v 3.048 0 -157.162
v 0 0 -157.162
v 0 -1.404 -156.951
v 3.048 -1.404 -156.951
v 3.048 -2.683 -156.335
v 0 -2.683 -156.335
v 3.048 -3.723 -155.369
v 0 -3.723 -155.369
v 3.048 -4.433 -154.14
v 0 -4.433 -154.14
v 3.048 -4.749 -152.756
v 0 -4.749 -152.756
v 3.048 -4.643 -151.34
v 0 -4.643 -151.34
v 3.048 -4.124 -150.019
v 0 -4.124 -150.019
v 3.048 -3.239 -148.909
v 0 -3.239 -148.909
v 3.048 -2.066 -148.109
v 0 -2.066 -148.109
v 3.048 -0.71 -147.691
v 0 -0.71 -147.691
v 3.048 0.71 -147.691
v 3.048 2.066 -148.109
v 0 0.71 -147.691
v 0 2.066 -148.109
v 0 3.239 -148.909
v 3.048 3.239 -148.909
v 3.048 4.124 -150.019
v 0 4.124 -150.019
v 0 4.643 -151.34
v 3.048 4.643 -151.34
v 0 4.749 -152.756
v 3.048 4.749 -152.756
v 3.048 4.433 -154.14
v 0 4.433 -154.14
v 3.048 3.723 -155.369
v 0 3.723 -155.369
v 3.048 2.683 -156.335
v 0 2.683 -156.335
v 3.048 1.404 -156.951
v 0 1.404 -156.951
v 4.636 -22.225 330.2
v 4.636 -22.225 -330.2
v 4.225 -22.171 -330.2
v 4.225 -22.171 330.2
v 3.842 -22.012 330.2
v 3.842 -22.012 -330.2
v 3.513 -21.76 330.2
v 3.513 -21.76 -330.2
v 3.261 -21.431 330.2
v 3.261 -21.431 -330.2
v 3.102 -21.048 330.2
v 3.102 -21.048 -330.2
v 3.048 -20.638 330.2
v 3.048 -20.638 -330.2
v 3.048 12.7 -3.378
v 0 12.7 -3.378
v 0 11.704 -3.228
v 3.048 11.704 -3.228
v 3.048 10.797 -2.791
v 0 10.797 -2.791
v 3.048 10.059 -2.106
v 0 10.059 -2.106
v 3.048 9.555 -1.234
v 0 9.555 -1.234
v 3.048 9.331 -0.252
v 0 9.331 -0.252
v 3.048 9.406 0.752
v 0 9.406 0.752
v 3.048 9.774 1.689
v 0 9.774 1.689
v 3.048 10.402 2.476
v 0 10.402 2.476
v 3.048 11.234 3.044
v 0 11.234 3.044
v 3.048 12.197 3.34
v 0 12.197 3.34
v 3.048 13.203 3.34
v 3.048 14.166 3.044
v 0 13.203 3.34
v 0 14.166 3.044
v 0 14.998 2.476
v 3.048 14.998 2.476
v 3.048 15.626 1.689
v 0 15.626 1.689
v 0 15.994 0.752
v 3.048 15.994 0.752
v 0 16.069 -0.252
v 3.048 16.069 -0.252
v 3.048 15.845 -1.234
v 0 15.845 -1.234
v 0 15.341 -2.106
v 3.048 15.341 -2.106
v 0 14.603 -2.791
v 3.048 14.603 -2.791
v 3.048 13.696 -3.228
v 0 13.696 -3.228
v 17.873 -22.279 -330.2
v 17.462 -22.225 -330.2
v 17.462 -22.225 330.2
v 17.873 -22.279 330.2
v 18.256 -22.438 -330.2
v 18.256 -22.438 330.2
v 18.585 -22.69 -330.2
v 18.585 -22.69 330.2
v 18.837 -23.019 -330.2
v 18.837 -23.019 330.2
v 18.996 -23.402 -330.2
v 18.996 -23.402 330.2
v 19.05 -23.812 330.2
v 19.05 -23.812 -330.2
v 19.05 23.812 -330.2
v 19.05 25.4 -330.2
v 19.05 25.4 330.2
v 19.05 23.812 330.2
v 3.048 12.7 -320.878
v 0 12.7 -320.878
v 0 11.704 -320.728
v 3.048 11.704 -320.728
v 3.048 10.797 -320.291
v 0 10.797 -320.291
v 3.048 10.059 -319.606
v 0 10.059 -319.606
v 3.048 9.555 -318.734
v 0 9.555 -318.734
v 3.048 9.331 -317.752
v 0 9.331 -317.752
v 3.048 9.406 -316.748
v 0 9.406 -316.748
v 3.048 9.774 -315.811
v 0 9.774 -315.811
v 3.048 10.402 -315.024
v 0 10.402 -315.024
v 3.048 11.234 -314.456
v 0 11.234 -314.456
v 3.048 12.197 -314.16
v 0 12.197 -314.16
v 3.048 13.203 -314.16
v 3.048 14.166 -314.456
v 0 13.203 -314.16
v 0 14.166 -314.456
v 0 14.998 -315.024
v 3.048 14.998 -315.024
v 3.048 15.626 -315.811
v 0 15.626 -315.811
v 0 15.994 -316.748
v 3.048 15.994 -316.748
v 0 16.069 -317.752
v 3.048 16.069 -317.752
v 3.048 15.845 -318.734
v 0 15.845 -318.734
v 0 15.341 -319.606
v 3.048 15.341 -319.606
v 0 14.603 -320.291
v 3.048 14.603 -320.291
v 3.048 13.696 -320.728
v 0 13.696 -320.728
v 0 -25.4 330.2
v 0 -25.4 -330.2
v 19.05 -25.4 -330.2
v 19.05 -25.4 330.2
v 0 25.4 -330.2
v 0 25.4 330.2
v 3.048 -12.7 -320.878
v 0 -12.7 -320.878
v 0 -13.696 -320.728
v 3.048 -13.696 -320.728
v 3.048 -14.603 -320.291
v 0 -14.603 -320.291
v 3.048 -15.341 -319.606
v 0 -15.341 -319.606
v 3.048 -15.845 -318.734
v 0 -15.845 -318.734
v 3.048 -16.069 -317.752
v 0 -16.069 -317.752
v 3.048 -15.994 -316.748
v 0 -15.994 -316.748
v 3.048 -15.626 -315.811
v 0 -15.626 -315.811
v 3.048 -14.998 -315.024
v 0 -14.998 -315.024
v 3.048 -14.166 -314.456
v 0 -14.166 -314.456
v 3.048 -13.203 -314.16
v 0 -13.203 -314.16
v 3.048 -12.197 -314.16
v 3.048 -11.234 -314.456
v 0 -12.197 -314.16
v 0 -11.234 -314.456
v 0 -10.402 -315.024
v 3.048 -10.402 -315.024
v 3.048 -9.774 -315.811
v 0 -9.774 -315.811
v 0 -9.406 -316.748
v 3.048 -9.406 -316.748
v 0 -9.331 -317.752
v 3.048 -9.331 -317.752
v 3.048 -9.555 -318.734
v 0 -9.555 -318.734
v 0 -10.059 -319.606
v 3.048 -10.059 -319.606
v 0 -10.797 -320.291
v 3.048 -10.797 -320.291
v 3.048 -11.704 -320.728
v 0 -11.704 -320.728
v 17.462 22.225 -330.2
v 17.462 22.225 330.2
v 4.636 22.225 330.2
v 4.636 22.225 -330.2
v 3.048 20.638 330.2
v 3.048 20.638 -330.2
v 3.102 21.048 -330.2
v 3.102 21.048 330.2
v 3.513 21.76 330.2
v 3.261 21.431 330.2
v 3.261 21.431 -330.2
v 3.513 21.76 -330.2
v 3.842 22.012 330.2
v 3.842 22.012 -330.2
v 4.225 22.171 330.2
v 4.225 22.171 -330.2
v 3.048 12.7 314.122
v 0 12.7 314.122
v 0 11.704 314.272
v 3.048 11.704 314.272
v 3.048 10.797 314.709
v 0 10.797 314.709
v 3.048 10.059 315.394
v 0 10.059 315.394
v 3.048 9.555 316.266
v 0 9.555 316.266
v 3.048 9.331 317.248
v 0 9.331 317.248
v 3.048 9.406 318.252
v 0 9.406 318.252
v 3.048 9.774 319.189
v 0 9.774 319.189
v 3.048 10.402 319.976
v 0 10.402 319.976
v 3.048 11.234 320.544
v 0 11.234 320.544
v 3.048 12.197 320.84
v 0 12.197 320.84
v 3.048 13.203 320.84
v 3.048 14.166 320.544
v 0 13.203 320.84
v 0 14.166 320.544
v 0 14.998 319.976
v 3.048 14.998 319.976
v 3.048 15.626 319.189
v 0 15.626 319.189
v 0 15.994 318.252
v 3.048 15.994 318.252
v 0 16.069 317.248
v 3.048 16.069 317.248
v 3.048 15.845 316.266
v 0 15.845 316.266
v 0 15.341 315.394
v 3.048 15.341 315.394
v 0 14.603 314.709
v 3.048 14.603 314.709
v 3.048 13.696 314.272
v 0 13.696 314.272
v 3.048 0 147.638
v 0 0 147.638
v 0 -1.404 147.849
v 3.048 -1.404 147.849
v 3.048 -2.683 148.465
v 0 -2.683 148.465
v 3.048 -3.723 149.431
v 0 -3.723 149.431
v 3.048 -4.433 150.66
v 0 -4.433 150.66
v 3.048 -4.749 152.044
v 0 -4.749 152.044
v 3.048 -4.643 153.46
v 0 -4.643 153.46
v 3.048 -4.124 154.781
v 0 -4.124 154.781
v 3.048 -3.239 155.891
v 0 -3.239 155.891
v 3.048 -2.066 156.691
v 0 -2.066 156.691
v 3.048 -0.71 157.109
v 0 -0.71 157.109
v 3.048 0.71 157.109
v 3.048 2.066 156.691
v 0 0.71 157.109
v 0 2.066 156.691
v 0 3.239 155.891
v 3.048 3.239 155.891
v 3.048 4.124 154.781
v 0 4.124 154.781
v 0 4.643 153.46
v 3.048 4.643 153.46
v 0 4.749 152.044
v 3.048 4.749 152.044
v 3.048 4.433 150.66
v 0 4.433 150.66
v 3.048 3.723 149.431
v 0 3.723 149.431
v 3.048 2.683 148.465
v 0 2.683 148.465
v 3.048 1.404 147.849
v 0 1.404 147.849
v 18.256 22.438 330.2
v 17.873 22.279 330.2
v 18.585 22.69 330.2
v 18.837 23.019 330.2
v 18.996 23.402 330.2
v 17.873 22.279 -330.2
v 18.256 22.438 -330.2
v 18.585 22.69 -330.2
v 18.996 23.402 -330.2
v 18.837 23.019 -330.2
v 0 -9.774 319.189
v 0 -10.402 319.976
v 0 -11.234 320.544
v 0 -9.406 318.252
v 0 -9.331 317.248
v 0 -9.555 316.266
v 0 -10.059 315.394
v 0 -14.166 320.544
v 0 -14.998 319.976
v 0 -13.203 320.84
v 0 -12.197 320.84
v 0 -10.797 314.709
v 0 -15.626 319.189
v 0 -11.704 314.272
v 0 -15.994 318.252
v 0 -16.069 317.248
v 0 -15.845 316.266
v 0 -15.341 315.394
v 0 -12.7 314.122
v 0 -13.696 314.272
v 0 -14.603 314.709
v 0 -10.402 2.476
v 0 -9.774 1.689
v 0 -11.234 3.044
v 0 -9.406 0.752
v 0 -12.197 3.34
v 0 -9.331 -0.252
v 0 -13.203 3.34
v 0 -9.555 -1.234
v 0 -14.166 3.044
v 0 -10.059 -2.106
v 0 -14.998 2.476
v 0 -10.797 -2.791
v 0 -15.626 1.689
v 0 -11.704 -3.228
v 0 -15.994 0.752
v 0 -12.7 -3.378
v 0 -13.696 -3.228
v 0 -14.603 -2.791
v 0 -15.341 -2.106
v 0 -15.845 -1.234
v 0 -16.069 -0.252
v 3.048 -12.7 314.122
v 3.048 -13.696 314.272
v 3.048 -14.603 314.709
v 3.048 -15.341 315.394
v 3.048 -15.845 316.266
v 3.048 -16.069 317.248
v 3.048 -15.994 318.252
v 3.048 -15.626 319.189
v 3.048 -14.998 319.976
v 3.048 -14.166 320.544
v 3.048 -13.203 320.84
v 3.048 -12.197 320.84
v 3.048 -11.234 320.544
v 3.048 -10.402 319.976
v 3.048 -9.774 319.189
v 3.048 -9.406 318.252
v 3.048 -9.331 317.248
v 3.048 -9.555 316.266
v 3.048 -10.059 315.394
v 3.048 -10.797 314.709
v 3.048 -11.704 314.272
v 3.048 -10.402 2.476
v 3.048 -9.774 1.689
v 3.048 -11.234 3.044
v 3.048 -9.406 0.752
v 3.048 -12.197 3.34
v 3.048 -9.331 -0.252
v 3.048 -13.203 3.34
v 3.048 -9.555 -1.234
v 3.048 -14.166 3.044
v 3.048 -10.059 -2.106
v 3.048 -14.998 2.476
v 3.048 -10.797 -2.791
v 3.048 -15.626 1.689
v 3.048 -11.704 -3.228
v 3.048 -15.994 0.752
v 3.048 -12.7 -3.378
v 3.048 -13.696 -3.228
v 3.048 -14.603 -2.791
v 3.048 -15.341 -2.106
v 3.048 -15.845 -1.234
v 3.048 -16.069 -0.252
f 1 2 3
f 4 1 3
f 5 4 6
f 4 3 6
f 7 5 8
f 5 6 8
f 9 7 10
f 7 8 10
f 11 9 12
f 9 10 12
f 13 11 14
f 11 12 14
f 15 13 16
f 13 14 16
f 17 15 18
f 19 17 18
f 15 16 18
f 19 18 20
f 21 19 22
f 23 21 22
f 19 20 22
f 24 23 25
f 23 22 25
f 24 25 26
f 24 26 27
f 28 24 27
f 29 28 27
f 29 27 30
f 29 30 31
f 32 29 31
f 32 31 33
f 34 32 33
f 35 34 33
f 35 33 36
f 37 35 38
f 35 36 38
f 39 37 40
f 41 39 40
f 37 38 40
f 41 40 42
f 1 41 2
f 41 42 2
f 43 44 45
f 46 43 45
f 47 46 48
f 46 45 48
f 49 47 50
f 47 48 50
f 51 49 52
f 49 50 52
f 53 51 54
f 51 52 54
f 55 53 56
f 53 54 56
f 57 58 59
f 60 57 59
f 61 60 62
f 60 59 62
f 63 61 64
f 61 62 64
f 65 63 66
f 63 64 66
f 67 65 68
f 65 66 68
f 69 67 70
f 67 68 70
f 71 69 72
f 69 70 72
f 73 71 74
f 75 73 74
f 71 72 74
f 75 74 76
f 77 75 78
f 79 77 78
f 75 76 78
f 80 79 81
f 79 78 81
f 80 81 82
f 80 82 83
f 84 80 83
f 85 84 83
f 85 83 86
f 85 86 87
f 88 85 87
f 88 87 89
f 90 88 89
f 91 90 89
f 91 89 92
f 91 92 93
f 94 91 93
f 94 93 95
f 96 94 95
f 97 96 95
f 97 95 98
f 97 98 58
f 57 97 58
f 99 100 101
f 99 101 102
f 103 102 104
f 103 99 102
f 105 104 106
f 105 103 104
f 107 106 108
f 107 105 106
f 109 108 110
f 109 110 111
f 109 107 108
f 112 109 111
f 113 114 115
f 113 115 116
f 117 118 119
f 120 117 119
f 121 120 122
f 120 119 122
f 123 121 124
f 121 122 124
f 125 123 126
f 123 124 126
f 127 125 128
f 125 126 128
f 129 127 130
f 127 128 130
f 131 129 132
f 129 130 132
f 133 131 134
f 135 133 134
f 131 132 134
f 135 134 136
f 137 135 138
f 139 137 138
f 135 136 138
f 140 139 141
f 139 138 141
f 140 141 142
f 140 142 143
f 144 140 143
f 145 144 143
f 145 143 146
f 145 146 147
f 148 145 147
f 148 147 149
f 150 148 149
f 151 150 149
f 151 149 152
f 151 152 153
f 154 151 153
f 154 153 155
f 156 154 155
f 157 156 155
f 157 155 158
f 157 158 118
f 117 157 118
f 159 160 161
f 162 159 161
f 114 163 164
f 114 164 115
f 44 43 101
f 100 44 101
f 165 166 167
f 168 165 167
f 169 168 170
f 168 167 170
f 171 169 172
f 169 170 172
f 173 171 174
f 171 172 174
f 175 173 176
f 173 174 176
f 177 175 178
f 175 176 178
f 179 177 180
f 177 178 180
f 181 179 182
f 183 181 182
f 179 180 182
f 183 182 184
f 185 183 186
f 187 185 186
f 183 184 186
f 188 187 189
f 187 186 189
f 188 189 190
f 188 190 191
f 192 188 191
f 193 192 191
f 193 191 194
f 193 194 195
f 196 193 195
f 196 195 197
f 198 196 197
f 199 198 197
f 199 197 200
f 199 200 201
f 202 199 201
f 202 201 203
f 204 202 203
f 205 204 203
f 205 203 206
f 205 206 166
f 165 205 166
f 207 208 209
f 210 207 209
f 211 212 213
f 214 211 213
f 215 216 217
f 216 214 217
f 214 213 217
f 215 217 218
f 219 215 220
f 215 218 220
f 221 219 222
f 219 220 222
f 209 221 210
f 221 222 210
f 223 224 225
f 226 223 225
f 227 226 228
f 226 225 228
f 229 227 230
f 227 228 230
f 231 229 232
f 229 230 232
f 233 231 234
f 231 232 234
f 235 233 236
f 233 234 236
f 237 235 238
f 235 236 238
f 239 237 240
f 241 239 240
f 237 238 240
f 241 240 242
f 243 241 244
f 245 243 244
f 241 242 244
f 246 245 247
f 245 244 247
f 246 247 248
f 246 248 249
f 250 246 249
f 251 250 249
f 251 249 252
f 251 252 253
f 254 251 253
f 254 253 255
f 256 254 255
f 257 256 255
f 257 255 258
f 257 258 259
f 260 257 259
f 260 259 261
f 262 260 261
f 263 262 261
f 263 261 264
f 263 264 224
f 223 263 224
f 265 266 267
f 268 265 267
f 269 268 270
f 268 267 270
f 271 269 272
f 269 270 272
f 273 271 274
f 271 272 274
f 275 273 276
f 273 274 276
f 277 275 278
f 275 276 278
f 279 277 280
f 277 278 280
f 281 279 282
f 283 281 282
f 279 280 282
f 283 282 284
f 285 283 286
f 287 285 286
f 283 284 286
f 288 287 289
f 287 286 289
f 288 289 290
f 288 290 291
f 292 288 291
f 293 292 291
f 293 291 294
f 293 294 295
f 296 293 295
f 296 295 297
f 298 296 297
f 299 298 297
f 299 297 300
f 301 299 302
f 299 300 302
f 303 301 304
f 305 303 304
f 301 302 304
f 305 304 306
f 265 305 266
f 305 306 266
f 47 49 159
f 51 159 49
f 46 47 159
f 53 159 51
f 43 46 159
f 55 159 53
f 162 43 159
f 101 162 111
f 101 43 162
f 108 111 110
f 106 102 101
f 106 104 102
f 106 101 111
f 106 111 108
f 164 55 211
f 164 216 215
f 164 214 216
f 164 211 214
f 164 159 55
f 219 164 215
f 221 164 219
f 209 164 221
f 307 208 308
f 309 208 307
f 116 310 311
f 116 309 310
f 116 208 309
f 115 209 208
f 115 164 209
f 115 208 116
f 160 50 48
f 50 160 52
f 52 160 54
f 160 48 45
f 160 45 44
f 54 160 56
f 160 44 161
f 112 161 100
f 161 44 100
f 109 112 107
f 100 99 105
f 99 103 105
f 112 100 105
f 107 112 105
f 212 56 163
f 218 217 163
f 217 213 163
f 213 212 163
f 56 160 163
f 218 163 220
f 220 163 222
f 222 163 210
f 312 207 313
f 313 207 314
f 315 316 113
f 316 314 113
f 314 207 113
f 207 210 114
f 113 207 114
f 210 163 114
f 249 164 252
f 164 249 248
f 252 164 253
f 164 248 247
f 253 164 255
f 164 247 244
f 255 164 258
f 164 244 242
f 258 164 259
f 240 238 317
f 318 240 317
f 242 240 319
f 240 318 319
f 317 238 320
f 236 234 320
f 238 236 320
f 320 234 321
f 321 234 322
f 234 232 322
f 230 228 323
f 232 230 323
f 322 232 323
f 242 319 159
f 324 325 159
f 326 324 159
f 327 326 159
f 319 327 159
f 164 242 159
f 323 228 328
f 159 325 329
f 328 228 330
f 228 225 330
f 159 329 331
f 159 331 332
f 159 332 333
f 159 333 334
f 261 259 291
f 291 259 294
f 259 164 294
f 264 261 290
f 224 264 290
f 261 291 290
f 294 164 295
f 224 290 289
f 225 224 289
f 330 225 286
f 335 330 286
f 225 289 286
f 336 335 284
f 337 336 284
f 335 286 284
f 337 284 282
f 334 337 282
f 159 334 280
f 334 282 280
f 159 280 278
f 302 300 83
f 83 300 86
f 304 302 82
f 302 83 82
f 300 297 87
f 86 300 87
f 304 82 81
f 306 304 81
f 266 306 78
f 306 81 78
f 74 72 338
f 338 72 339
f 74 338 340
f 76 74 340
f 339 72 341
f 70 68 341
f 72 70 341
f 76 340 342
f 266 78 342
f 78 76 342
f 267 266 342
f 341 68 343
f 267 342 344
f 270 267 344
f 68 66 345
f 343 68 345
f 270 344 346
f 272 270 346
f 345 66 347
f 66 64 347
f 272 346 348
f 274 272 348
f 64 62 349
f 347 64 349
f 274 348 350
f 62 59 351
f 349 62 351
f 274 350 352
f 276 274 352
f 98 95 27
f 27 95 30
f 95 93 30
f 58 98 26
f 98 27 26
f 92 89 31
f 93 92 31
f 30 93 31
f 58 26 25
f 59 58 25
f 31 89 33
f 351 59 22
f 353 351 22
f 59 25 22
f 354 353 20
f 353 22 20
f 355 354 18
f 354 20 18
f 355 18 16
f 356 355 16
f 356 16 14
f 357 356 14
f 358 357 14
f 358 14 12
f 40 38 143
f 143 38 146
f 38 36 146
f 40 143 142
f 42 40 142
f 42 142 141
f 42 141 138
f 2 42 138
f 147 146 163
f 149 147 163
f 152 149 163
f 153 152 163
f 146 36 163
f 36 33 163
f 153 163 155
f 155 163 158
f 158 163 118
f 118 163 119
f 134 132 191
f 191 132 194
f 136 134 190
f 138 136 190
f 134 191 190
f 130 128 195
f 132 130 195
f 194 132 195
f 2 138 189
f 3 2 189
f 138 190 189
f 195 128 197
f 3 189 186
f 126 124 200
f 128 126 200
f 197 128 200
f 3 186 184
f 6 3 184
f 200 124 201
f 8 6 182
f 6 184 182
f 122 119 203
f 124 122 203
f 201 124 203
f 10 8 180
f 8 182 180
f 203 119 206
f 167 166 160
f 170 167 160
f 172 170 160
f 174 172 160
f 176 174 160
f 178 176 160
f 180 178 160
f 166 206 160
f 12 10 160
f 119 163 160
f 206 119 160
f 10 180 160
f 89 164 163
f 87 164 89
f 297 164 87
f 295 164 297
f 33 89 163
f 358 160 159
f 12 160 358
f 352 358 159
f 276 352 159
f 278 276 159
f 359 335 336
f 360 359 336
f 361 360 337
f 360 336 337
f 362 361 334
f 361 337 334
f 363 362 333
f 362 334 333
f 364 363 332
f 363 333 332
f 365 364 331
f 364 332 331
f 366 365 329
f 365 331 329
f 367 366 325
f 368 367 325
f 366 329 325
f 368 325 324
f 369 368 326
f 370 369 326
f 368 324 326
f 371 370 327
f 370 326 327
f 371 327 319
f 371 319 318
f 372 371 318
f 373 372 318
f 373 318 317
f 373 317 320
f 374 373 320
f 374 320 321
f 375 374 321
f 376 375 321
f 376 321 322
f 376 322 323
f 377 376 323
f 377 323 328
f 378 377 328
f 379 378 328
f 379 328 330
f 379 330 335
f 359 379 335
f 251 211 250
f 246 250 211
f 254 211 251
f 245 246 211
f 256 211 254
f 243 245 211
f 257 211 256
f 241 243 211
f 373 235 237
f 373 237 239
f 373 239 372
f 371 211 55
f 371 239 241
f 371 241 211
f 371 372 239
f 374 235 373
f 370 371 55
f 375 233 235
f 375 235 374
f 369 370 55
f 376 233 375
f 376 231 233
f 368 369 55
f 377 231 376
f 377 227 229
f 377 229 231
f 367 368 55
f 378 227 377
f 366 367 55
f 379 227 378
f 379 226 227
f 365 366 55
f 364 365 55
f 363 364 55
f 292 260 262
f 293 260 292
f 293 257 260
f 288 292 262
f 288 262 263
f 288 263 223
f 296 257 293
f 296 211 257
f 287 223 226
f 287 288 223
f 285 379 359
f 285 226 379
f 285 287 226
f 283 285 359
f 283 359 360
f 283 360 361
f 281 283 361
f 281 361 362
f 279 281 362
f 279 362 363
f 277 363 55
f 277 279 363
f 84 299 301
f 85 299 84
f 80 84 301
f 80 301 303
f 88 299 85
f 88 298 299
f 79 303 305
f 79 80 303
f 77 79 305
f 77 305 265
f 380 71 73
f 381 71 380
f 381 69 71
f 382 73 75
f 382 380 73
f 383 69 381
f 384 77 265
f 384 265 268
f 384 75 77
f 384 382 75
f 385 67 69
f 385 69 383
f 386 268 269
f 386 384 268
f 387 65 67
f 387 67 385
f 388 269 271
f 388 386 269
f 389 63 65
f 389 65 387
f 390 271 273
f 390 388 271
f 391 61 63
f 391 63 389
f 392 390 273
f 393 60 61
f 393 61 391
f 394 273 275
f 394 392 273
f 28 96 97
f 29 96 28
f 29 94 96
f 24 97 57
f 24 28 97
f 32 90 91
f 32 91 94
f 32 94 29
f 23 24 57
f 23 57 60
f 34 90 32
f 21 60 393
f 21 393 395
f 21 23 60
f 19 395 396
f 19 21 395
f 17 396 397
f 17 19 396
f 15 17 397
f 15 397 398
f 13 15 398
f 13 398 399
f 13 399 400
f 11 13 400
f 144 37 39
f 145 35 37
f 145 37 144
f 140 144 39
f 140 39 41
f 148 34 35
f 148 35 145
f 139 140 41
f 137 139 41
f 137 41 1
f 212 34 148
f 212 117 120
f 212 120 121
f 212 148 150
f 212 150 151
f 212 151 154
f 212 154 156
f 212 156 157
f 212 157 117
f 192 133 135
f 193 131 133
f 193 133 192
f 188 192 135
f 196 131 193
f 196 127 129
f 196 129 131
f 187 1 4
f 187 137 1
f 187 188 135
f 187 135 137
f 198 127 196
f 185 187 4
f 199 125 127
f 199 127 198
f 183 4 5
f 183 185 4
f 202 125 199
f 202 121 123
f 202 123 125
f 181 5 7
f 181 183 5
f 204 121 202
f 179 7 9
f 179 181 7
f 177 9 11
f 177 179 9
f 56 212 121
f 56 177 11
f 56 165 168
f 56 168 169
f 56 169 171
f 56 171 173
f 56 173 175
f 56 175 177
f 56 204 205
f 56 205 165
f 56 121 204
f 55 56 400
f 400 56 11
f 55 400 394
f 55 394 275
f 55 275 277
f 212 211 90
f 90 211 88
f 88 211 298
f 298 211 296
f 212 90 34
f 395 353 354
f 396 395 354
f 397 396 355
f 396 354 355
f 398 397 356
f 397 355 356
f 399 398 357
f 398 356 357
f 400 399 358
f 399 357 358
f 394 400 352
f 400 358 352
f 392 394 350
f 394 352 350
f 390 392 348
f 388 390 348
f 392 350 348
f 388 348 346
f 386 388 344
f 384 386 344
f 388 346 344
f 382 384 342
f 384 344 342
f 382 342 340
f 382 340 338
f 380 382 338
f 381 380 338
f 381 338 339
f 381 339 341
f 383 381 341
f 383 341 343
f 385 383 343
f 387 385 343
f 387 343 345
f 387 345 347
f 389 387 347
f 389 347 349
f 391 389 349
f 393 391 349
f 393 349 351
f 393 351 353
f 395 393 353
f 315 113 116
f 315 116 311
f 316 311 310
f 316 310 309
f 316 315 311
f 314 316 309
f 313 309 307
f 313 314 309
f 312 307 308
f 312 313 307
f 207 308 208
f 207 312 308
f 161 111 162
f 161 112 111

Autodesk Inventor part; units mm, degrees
ref_plane "YZ Plane" through (0, 0, 0) normal (1, 0, 0) x (0, 1, 0)
ref_plane "XZ Plane" through (0, 0, 0) normal (0, 1, 0) x (-1, 0, 0)
ref_plane "XY Plane" through (0, 0, 0) normal (0, 0, 1) x (1, 0, 0)
sketch "Sketch1" plane through (0, 0, 0) normal (0, 0, 1) x (1, 0, 0)
  line L0 (0, 25.4) -> (0, -25.4)
  line L1 (0, -25.4) -> (19.05, -25.4)
  line L2 (0, 25.4) -> (19.05, 25.4)
  line L3 (19.05, 25.4) -> (19.05, 22.225)
  line L4 (19.05, 22.225) -> (3.048, 22.225)
  line L5 (3.048, 22.225) -> (3.048, -22.225)
  line L6 (3.048, -22.225) -> (19.05, -22.225)
  line L7 (19.05, -22.225) -> (19.05, -25.4)
  point P0 (0, 0)
  point P1 (0, 0)
  dimension "d0" = 50.8
  dimension "d1" = 19.05
  dimension "d2" = 3.175
  dimension "d3" = 16.002
extrude "Extrusion1" add sketch "Sketch1" along normal mid plane 660.4
fillet "Fillet1" radius 1.5875 4 edges at (3.048, 22.225, 0) (3.048, -22.225, 0) (19.05, -22.225, 0) (19.05, 22.225, 0)
sketch "Sketch2" plane through (3.048, -20.6375, -330.2) normal (1, 0, 0) x (0, 0, -1)
  point P0 (-330.2, 20.6375)
  point P1 (-177.8, 20.6375)
  point P2 (-482.6, 20.6375)
  dimension "d7" = 304.8
  dimension "d8" = 152.4
hole "Hole1" at (3.048, 0, -152.4) at (3.048, 0, 152.4) direction (-1, 0, 0) diameter 9.525 depth 25.4 tip angle 118
sketch "Sketch3" plane through (3.048, -20.6375, -330.2) normal (1, 0, 0) x (0, 0, -1)
  circle A0 centre (-647.7, 33.3375) radius 12.7 projected
  circle A1 centre (-647.7, 7.9375) radius 12.7 projected
  circle A2 centre (-12.7, 33.3375) radius 12.7 projected
  circle A3 centre (-12.7, 7.9375) radius 12.7 projected
  circle A4 centre (-330.2, 33.3375) radius 12.7 projected
  circle A5 centre (-330.2, 7.9375) radius 12.7 projected
  point P0 (-330.2, 20.6375)
hole "Hole2" at (3.048, -12.7, -317.5) at (3.048, -12.7, 0) at (3.048, -12.7, 317.5) at (3.048, 12.7, 317.5) at (3.048, 12.7, 0) at (3.048, 12.7, -317.5) direction (-1, 0, 0) diameter 6.7564 depth 25.4 tip angle 118 clearance for "Flat Head Machine Screw (82)" size "1/4" standard "Ansi Unified Screw Threads"
equation "\"d4\" = Length"
equation "\"Length\" = 660.4"
properties part number "NASA-20-OP-01" material "Aluminum 6061"
